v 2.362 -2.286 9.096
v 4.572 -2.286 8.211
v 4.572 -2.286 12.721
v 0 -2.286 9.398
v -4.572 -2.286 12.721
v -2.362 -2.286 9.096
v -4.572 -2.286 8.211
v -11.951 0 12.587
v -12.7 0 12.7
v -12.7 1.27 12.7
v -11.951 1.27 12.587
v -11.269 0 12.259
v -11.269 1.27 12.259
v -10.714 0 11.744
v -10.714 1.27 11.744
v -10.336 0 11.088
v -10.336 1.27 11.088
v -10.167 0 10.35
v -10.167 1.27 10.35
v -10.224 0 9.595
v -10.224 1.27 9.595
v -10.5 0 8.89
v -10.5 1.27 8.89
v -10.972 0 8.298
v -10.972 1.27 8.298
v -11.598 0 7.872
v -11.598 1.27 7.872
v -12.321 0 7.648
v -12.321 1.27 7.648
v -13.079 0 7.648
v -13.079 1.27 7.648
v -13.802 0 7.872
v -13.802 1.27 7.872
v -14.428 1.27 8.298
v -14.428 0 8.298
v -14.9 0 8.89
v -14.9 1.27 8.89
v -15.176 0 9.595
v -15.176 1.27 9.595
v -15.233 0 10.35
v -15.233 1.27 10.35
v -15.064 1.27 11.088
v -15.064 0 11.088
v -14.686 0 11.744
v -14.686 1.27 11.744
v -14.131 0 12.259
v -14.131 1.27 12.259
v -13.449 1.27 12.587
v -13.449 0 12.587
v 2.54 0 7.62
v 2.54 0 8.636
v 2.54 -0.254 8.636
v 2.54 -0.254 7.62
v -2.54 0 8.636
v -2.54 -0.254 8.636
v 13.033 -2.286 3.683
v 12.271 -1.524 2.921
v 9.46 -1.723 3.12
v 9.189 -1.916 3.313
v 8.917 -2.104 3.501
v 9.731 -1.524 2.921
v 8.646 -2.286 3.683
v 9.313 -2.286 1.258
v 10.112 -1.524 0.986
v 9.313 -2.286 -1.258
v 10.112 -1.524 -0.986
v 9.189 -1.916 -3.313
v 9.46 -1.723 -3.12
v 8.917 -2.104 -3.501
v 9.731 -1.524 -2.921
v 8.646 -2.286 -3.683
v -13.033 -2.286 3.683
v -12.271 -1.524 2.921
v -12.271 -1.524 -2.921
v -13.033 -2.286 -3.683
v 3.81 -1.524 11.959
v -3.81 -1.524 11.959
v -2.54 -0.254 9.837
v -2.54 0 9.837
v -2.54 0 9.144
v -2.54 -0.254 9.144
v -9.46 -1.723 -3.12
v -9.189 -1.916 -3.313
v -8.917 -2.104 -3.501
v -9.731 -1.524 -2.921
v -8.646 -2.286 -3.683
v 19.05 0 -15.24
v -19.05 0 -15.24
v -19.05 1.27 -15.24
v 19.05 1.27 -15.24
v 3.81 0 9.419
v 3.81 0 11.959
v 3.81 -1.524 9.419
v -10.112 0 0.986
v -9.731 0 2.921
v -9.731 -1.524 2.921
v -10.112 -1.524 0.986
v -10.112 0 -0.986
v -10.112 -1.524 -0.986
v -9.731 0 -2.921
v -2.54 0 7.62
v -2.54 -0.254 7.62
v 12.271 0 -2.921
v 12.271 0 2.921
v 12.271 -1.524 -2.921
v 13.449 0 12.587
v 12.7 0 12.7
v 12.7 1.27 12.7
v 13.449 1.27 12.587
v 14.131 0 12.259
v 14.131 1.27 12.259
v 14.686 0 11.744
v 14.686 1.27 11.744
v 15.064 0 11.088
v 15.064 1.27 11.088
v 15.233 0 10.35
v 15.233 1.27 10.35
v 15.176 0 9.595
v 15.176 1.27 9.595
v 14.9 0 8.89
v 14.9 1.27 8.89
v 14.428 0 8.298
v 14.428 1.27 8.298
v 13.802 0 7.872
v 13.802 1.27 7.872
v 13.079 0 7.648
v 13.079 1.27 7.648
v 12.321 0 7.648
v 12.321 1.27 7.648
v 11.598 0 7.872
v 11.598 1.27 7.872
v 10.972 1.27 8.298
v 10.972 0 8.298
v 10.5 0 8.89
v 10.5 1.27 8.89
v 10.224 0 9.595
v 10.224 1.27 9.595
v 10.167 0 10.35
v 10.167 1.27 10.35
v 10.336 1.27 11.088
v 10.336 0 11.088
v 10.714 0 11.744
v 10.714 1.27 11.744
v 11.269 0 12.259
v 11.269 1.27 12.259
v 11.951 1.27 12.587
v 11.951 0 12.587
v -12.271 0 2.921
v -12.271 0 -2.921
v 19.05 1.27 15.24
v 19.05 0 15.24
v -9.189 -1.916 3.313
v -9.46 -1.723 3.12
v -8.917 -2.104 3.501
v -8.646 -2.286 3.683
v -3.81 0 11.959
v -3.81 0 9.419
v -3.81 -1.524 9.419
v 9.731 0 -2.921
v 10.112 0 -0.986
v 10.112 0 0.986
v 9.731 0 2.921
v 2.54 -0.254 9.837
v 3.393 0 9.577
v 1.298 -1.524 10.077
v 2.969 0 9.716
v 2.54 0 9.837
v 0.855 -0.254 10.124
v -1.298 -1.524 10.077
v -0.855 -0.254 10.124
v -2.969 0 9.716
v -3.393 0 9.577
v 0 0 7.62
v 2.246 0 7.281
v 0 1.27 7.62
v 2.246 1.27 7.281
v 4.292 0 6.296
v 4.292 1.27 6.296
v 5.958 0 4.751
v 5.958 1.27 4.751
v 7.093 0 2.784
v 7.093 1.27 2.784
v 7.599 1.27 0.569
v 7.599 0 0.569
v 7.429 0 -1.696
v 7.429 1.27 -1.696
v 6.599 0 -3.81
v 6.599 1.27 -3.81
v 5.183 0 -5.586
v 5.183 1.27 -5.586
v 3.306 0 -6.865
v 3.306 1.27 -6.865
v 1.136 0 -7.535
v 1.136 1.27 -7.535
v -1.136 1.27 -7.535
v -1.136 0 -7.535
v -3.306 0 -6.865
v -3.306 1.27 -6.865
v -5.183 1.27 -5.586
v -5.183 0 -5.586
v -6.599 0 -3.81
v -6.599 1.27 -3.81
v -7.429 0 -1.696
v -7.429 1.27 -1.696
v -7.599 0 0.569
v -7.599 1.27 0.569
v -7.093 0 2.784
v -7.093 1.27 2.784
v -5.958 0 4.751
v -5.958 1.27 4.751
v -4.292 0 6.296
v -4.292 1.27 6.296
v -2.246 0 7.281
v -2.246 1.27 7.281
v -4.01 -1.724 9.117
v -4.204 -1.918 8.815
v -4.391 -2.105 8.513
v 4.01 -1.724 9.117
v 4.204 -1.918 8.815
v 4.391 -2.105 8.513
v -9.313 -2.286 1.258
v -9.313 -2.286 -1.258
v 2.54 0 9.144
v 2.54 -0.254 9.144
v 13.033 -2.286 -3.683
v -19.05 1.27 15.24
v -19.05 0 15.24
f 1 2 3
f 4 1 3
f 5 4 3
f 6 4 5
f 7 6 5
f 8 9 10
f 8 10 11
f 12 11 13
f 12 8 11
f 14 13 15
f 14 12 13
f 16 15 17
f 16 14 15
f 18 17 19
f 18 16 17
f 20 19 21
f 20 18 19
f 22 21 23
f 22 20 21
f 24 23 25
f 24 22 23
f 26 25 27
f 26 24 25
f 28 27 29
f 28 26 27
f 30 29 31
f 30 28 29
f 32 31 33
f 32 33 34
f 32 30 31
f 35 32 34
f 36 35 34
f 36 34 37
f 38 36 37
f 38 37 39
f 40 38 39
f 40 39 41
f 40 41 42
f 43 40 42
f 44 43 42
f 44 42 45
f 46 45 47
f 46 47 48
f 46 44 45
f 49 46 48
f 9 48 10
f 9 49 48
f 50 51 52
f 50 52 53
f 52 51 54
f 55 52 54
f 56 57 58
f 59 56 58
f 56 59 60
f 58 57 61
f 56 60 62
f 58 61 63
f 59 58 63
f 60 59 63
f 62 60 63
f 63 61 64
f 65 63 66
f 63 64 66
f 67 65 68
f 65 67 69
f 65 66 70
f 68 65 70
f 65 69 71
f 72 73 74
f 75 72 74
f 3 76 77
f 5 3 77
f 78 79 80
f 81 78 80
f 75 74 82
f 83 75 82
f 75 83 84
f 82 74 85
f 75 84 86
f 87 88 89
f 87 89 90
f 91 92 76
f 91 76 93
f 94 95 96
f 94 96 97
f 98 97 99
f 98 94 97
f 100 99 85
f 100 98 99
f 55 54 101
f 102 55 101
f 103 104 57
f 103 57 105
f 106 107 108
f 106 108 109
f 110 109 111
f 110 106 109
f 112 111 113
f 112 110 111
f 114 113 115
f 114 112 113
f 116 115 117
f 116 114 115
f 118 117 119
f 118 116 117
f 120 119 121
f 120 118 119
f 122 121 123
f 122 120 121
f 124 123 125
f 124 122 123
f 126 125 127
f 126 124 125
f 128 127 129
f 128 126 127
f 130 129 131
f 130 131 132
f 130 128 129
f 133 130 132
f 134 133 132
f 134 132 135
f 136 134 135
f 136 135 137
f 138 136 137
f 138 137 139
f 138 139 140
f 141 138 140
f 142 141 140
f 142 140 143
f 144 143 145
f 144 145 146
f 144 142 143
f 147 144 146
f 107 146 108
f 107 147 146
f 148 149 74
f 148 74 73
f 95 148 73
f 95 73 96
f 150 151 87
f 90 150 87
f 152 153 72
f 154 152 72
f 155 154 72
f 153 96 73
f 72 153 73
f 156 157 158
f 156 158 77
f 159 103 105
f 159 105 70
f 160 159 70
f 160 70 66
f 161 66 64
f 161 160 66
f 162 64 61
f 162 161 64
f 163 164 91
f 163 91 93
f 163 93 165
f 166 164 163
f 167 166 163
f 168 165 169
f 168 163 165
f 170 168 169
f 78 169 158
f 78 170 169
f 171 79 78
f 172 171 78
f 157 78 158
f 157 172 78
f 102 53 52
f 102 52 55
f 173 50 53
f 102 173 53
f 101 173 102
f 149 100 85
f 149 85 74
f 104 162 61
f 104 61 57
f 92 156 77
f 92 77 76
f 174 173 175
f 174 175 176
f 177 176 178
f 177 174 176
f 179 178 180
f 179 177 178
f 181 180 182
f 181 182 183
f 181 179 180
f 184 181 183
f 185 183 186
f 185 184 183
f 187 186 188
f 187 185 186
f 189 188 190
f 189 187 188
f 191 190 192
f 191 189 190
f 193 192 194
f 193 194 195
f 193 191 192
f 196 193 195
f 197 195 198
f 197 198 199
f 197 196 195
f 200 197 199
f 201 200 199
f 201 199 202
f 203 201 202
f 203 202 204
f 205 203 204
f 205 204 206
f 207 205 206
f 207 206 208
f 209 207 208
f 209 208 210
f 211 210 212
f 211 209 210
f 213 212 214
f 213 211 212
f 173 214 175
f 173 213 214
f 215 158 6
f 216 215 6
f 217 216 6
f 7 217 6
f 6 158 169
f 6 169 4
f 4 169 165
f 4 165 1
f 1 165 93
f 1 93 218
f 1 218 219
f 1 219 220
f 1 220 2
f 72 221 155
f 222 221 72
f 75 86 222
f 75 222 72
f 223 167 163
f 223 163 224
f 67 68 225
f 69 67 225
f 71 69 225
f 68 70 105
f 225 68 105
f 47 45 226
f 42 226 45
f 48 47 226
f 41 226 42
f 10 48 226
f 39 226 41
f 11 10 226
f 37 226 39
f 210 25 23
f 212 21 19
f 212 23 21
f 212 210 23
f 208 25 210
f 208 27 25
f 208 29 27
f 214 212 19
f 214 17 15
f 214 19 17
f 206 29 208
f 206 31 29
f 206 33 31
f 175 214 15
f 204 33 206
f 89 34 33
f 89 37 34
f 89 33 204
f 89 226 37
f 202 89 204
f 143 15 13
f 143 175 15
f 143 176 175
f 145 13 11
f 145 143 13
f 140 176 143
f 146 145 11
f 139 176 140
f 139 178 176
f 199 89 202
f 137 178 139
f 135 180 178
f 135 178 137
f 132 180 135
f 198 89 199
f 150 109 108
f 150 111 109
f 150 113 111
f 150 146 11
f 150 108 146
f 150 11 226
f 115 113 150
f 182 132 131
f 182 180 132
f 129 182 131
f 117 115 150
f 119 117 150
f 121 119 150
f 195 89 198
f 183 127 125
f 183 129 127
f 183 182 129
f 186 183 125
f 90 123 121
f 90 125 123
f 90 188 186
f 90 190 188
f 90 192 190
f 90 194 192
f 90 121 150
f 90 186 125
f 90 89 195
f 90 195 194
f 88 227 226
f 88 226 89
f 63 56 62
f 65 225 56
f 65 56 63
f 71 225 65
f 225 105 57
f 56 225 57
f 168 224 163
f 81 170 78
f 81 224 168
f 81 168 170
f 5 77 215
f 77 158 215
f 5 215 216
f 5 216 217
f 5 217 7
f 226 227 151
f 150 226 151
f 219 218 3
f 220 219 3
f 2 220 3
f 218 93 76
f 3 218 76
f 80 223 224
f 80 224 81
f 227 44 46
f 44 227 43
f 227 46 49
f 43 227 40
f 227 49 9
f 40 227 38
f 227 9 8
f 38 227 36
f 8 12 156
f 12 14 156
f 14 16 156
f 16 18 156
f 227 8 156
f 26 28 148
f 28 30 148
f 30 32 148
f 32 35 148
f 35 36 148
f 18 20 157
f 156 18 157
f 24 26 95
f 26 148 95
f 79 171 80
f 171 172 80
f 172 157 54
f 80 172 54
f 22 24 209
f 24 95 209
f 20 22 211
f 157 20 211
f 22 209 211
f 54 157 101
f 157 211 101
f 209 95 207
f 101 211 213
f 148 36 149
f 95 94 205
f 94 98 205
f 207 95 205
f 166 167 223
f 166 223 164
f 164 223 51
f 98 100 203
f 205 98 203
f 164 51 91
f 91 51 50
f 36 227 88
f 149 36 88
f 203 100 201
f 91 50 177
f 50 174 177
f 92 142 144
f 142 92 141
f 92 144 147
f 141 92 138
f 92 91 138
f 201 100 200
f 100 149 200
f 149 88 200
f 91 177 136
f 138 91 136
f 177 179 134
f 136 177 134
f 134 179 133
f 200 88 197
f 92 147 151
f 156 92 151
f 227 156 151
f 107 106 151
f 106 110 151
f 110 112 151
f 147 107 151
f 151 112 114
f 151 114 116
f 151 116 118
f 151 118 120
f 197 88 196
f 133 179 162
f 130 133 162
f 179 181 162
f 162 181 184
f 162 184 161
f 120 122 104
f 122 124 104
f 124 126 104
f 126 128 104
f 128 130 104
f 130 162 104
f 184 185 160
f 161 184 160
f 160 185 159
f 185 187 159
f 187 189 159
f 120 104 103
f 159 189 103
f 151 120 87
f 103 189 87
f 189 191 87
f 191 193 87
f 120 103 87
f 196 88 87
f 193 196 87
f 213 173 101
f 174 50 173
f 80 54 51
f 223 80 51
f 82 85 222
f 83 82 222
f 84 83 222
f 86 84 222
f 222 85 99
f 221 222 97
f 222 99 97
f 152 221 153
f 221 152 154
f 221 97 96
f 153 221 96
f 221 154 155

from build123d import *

# Parameters (mm, degrees)
SKETCH1_W                     = 38.1
SKETCH1_H                     = 30.48
SKETCH1_R                     = 7.62
SKETCH1_R_2                   = 2.54
BOSS_EXTRUDE1_DEPTH           = 1.27
BOSS_EXTRUDE2_DEPTH           = 1.524
BOSS_EXTRUDE3_DEPTH           = 0.762
BOSS_EXTRUDE3_DRAFT           = -45
BOSS_EXTRUDE3_PROFILE_2_DEPTH = 0.762
BOSS_EXTRUDE3_PROFILE_2_DRAFT = -45
BOSS_EXTRUDE3_PROFILE_3_DEPTH = 0.762
BOSS_EXTRUDE3_PROFILE_3_DRAFT = -45
SKETCH6_W                     = 5.08
SKETCH6_H                     = 1.016
BOSS_EXTRUDE4_DEPTH           = 0.254


with BuildPart() as part:
    # Sketch1 → Boss-Extrude1 (new body)
    with BuildSketch(Plane(origin=(0, 0, 0), x_dir=(1, 0, 0), z_dir=(0, 1, 0))):
        Rectangle(SKETCH1_W, SKETCH1_H)
        with Locations(Location((0, 0, 0), (0, 0, 270))):
            Circle(SKETCH1_R, mode=Mode.SUBTRACT)
        with Locations(Location((12.7, -10.16, 0), (0, 0, 270))):
            Circle(SKETCH1_R_2, mode=Mode.SUBTRACT)
        with Locations(Location((-12.7, -10.16, 0), (0, 0, 270))):
            Circle(SKETCH1_R_2, mode=Mode.SUBTRACT)
    extrude(amount=BOSS_EXTRUDE1_DEPTH)

    # Sketch2 → Boss-Extrude2 (add)
    with BuildSketch(Plane(origin=(0, 0, 0), x_dir=(-1, 0, 0), z_dir=(0, -1, 0))):
        with BuildLine():
            ThreePointArc((-9.731051279, 2.921), (-10.16, 0), (-9.731051279, -2.921))
            Line((-9.731051279, -2.921), (-12.271051279, -2.921))
            Line((-12.271051279, -2.921), (-12.271051279, 2.921))
            Line((-12.271051279, 2.921), (-9.731051279, 2.921))
        make_face()
        with BuildLine():
            ThreePointArc((-3.81, -9.418572079), (0, -10.16), (3.81, -9.418572079))
            Line((3.81, -9.418572079), (3.81, -11.958572079))
            Line((3.81, -11.958572079), (-3.81, -11.958572079))
            Line((-3.81, -11.958572079), (-3.81, -9.418572079))
        make_face()
        with BuildLine():
            ThreePointArc((9.731051279, -2.921), (10.16, 0), (9.731051279, 2.921))
            Line((9.731051279, 2.921), (12.271051279, 2.921))
            Line((12.271051279, 2.921), (12.271051279, -2.921))
            Line((12.271051279, -2.921), (9.731051279, -2.921))
        make_face()
    extrude(amount=BOSS_EXTRUDE2_DEPTH)


with BuildPart() as boss_extrude3_tool:
    # Sketch4 → Boss-Extrude3 (with draft: the straight prism first)
    with BuildSketch(Plane(origin=(0, -1.524, 0), x_dir=(-1, 0, 0), z_dir=(0, -1, 0))):
        with BuildLine():
            ThreePointArc((3.81, -9.418572079), (0, -10.16), (-3.81, -9.418572079))
            Line((-3.81, -9.418572079), (-3.81, -11.958572079))
            Line((-3.81, -11.958572079), (3.81, -11.958572079))
            Line((3.81, -11.958572079), (3.81, -9.418572079))
        make_face()
    extrude(amount=BOSS_EXTRUDE3_DEPTH)
    # Boss-Extrude3: the draft: its side faces are tilted about the plane it starts from
    boss_extrude3_sides = [boss_extrude3_tool.faces().sort_by_distance(p)[0] for p in [
        (3.81, -1.905, 10.688572079),
        (0, -1.905, 11.958572079),
        (-3.81, -1.905, 10.688572079),
        (0, -1.905, 10.16),
    ]]
    draft(boss_extrude3_sides, Plane(origin=(0, -1.524, 0), x_dir=(-1, 0, 0), z_dir=(0, -1, 0)), BOSS_EXTRUDE3_DRAFT)


with BuildPart() as part_1:
    add(part.part)

    # Boss-Extrude3: add boss_extrude3_tool
    add(boss_extrude3_tool.part)


with BuildPart() as boss_extrude3_profile_2_tool:
    # Sketch4 → Boss-Extrude3 profile 2 (with draft: the straight prism first)
    with BuildSketch(Plane(origin=(0, -1.524, 0), x_dir=(-1, 0, 0), z_dir=(0, -1, 0))):
        with BuildLine():
            Line((12.271051279, 2.921), (9.731051279, 2.921))
            ThreePointArc((9.731051279, 2.921), (10.16, 0), (9.731051279, -2.921))
            Line((9.731051279, -2.921), (12.271051279, -2.921))
            Line((12.271051279, -2.921), (12.271051279, 2.921))
        make_face()
    extrude(amount=BOSS_EXTRUDE3_PROFILE_2_DEPTH)
    # Boss-Extrude3 profile 2: the draft: its side faces are tilted about the plane it starts from
    boss_extrude3_profile_2_sides = [boss_extrude3_profile_2_tool.faces().sort_by_distance(p)[0] for p in [
        (-11.001051279, -1.905, -2.921),
        (-10.16, -1.905, 0),
        (-11.001051279, -1.905, 2.921),
        (-12.271051279, -1.905, 0),
    ]]
    draft(boss_extrude3_profile_2_sides, Plane(origin=(0, -1.524, 0), x_dir=(-1, 0, 0), z_dir=(0, -1, 0)), BOSS_EXTRUDE3_PROFILE_2_DRAFT)


with BuildPart() as part_2:
    add(part_1.part)

    # Boss-Extrude3 profile 2: add boss_extrude3_profile_2_tool
    add(boss_extrude3_profile_2_tool.part)


with BuildPart() as boss_extrude3_profile_3_tool:
    # Sketch4 → Boss-Extrude3 profile 3 (with draft: the straight prism first)
    with BuildSketch(Plane(origin=(0, -1.524, 0), x_dir=(-1, 0, 0), z_dir=(0, -1, 0))):
        with BuildLine():
            Line((-9.731051279, 2.921), (-12.271051279, 2.921))
            Line((-12.271051279, 2.921), (-12.271051279, -2.921))
            Line((-12.271051279, -2.921), (-9.731051279, -2.921))
            ThreePointArc((-9.731051279, -2.921), (-10.16, 0), (-9.731051279, 2.921))
        make_face()
    extrude(amount=BOSS_EXTRUDE3_PROFILE_3_DEPTH)
    # Boss-Extrude3 profile 3: the draft: its side faces are tilted about the plane it starts from
    boss_extrude3_profile_3_sides = [boss_extrude3_profile_3_tool.faces().sort_by_distance(p)[0] for p in [
        (11.001051279, -1.905, -2.921),
        (12.271051279, -1.905, 0),
        (11.001051279, -1.905, 2.921),
        (10.16, -1.905, 0),
    ]]
    draft(boss_extrude3_profile_3_sides, Plane(origin=(0, -1.524, 0), x_dir=(-1, 0, 0), z_dir=(0, -1, 0)), BOSS_EXTRUDE3_PROFILE_3_DRAFT)


with BuildPart() as part_3:
    add(part_2.part)

    # Boss-Extrude3 profile 3: add boss_extrude3_profile_3_tool
    add(boss_extrude3_profile_3_tool.part)

    # Sketch6 → Boss-Extrude4 (add)
    with BuildSketch(Plane(origin=(0, 0, 0), x_dir=(-1, 0, 0), z_dir=(0, -1, 0))):
        with Locations((0, -8.128)):
            Rectangle(SKETCH6_W, SKETCH6_H)
        with Locations((0, -9.652)):
            Rectangle(SKETCH6_W, SKETCH6_H)
    extrude(amount=BOSS_EXTRUDE4_DEPTH)


solid = part_3.part
